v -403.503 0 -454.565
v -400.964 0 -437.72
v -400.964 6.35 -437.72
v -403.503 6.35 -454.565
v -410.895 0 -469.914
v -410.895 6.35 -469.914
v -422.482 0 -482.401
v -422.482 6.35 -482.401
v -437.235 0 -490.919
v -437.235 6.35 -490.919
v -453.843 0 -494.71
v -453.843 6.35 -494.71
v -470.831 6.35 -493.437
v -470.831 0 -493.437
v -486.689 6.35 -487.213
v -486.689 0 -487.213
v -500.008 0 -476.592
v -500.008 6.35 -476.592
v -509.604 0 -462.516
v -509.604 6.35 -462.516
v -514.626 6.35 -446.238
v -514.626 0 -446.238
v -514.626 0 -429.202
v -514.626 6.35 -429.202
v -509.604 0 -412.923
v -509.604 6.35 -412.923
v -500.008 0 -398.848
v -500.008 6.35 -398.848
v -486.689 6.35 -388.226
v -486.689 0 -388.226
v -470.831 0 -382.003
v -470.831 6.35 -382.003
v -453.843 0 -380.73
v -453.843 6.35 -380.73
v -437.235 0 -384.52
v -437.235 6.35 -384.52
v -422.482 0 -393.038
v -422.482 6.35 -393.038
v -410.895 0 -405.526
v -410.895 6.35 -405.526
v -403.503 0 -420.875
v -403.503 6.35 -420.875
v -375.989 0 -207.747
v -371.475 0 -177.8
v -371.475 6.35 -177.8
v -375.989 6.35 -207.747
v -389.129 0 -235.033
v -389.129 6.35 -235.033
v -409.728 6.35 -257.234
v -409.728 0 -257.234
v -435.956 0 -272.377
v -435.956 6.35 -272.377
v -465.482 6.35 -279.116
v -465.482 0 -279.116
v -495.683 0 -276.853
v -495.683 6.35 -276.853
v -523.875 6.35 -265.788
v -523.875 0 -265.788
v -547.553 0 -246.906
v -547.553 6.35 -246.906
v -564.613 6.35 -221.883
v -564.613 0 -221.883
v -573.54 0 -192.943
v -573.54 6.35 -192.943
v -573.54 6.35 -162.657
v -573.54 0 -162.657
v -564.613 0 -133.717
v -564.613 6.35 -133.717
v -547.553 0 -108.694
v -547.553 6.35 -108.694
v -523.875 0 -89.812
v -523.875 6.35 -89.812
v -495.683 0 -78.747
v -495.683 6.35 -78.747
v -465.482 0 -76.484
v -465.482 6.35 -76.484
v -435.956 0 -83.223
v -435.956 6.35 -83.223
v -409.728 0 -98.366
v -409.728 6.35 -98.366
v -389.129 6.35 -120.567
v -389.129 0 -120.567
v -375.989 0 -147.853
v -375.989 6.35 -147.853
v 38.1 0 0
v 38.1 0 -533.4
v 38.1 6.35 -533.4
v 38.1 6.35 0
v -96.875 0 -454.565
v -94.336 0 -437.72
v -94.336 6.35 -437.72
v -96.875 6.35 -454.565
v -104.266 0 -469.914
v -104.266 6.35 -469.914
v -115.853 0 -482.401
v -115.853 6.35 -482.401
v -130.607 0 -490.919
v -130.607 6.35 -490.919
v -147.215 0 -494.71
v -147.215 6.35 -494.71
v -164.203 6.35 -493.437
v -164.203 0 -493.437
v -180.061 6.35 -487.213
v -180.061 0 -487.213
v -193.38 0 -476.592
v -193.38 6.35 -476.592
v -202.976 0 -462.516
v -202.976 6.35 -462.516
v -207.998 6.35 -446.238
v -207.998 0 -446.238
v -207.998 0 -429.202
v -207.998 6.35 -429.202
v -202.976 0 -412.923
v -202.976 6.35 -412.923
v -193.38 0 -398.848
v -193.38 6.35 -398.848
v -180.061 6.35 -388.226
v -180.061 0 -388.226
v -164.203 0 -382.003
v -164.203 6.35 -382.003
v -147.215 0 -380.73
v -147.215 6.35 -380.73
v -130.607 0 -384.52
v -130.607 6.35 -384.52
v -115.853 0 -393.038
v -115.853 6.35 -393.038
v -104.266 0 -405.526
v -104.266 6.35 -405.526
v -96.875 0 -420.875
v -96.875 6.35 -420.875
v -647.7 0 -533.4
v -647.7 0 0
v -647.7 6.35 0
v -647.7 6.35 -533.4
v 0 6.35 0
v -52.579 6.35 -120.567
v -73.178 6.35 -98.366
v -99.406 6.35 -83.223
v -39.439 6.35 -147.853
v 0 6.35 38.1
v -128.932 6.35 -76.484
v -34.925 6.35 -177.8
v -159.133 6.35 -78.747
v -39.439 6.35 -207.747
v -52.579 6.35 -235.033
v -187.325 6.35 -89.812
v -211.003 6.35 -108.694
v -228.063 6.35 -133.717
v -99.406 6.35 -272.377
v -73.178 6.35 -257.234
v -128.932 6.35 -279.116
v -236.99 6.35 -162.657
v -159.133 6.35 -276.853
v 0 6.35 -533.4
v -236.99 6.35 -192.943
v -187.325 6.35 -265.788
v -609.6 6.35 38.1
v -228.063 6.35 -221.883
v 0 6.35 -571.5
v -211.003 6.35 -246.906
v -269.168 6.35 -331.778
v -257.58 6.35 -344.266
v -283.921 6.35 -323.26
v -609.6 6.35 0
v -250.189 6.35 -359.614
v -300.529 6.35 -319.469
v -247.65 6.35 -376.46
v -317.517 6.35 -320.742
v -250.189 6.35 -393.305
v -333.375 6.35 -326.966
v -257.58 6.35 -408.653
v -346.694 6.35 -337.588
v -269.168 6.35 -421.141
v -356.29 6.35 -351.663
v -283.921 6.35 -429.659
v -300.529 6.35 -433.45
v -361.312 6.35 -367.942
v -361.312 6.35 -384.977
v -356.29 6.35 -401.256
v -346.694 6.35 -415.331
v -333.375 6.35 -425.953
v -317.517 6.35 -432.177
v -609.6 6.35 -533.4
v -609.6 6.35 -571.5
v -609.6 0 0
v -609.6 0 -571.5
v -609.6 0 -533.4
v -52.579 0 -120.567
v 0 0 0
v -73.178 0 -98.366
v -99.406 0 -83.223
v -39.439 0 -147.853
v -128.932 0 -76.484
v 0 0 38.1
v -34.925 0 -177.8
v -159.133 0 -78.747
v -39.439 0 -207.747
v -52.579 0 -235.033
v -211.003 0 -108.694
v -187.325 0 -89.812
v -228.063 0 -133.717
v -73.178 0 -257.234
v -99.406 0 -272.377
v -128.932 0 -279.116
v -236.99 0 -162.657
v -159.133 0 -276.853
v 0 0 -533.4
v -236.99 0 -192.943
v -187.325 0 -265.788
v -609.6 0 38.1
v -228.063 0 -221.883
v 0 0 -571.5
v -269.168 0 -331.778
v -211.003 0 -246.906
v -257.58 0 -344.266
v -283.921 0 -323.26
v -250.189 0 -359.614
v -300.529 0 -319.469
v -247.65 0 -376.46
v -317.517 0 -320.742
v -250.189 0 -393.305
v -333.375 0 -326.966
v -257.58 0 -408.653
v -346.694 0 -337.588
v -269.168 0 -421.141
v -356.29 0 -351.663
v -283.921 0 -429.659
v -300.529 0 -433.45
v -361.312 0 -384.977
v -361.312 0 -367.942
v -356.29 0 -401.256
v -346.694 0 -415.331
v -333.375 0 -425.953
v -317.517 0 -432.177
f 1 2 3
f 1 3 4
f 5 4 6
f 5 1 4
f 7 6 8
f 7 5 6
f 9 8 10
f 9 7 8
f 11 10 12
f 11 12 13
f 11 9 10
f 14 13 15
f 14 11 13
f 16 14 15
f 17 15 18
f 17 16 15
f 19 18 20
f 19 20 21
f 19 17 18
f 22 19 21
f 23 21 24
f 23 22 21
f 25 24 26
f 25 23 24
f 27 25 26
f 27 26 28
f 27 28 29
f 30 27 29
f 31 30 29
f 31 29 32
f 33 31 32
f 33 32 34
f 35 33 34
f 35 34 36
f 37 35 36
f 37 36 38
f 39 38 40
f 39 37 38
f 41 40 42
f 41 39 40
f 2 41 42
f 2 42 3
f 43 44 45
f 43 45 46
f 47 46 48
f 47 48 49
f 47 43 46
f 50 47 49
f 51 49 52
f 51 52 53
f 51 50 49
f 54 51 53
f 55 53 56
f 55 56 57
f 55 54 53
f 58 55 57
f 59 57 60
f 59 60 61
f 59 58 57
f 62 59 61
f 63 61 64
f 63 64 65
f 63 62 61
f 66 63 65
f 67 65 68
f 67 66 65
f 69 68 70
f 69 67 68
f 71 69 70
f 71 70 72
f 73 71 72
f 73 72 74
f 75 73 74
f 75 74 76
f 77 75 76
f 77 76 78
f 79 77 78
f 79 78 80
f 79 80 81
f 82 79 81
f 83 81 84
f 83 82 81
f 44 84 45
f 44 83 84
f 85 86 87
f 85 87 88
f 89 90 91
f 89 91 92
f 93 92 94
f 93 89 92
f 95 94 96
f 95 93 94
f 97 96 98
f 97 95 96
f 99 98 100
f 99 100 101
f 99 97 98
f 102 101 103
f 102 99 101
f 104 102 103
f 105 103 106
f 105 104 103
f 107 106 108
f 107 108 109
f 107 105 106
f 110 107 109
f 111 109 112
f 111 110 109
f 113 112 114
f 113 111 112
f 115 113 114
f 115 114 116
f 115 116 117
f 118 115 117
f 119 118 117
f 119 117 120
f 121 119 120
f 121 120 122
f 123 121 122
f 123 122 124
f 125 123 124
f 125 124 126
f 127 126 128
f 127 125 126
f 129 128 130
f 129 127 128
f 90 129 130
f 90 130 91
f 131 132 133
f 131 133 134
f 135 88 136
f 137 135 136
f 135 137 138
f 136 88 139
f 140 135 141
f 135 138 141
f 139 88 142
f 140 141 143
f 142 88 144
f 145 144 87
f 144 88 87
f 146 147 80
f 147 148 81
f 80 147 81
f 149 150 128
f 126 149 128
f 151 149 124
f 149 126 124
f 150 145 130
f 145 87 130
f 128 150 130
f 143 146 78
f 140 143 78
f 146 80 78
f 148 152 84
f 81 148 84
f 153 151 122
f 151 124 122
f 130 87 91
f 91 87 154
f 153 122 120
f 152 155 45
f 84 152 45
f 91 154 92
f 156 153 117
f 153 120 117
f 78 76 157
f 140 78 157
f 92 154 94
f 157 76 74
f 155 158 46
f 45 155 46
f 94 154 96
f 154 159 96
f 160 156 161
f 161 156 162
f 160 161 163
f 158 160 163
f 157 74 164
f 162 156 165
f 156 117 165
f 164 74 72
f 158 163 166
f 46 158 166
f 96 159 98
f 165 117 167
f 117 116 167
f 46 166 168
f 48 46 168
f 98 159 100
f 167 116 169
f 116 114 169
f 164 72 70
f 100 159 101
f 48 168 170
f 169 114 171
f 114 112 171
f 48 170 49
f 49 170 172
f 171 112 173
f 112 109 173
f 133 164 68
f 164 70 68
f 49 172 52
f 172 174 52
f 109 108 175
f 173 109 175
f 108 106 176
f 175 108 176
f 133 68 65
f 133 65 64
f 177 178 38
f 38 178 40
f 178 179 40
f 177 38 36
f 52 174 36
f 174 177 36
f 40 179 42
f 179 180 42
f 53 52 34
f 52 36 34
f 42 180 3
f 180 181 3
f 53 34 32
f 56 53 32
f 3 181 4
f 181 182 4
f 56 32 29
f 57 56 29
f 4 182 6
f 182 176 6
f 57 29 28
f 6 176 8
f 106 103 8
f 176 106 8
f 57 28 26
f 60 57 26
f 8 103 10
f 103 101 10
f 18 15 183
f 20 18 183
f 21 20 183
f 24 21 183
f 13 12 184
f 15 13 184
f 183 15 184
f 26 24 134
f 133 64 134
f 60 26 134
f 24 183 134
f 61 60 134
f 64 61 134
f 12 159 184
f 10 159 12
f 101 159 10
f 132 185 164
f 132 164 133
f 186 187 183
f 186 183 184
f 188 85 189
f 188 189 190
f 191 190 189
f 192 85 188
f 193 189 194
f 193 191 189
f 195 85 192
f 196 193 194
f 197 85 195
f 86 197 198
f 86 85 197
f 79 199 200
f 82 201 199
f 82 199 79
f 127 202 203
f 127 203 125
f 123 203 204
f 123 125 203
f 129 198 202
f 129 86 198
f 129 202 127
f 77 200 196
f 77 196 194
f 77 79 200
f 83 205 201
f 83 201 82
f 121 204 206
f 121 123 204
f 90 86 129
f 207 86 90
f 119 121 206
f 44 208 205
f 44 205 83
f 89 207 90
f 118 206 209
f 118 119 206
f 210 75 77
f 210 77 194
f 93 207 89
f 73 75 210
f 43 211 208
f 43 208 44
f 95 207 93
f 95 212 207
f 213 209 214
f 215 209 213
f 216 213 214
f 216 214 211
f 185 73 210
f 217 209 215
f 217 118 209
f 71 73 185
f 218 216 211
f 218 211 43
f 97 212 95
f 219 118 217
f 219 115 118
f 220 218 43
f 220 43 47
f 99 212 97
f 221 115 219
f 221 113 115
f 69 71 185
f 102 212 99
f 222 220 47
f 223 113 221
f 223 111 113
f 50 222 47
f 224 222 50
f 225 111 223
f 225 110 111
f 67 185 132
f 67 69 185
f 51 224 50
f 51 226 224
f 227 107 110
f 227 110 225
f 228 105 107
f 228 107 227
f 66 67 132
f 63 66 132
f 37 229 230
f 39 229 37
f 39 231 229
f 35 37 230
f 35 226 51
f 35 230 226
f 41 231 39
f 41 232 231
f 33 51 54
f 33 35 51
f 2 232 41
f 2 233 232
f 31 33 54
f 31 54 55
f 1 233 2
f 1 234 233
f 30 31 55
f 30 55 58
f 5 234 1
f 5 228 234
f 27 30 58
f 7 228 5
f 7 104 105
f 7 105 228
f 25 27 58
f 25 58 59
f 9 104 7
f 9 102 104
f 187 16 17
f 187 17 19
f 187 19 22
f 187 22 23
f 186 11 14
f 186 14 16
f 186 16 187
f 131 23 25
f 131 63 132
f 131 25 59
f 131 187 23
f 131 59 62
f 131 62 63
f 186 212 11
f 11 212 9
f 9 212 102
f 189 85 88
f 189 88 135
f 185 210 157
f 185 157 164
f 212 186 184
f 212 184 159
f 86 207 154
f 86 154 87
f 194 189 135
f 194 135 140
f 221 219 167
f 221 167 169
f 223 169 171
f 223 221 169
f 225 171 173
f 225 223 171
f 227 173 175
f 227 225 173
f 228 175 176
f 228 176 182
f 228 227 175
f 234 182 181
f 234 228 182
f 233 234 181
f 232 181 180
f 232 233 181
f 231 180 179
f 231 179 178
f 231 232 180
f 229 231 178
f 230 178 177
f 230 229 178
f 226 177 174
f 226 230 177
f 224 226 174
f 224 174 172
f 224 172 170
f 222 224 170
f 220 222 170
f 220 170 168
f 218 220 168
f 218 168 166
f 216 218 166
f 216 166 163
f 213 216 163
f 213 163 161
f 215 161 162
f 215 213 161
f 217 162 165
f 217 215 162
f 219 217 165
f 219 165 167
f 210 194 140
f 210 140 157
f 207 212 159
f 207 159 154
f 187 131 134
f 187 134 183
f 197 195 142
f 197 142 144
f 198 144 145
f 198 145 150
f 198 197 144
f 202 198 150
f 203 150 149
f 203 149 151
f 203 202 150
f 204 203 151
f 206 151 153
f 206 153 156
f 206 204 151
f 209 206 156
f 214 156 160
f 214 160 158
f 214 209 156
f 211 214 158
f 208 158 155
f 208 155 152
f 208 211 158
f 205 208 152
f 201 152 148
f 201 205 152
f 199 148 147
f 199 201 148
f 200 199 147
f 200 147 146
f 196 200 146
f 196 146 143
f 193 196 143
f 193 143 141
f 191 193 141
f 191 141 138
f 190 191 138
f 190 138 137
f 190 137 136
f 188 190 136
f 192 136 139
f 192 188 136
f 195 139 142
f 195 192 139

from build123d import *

# Parameters (mm, degrees)
SKETCH1_R           = 101.6
SKETCH1_R_2         = 57.15
BOSS_EXTRUDE1_DEPTH = 6.35


with BuildPart() as part:
    # Sketch1 → Boss-Extrude1 (new body)
    with BuildSketch(Plane(origin=(0, 0, 0), x_dir=(1, 0, 0), z_dir=(0, 1, 0))):
        Polygon((0, 0), (0, -38.1), (-609.6, -38.1), (-609.6, 0), (-647.7, 0), (-647.7, 533.4), (-609.6, 533.4), (-609.6, 571.5), (0, 571.5), (0, 533.4), (38.1, 533.4), (38.1, 0), align=None)
        with Locations((-473.075, 177.8)):
            Circle(SKETCH1_R, mode=Mode.SUBTRACT)
        with Locations((-136.525, 177.8)):
            Circle(SKETCH1_R, mode=Mode.SUBTRACT)
        with Locations((-304.8, 376.459625679)):
            Circle(SKETCH1_R_2, mode=Mode.SUBTRACT)
        with Locations((-151.485932589, 437.719781848)):
            Circle(SKETCH1_R_2, mode=Mode.SUBTRACT)
        with Locations((-458.114067411, 437.719781848)):
            Circle(SKETCH1_R_2, mode=Mode.SUBTRACT)
    extrude(amount=BOSS_EXTRUDE1_DEPTH)


solid = part.part
